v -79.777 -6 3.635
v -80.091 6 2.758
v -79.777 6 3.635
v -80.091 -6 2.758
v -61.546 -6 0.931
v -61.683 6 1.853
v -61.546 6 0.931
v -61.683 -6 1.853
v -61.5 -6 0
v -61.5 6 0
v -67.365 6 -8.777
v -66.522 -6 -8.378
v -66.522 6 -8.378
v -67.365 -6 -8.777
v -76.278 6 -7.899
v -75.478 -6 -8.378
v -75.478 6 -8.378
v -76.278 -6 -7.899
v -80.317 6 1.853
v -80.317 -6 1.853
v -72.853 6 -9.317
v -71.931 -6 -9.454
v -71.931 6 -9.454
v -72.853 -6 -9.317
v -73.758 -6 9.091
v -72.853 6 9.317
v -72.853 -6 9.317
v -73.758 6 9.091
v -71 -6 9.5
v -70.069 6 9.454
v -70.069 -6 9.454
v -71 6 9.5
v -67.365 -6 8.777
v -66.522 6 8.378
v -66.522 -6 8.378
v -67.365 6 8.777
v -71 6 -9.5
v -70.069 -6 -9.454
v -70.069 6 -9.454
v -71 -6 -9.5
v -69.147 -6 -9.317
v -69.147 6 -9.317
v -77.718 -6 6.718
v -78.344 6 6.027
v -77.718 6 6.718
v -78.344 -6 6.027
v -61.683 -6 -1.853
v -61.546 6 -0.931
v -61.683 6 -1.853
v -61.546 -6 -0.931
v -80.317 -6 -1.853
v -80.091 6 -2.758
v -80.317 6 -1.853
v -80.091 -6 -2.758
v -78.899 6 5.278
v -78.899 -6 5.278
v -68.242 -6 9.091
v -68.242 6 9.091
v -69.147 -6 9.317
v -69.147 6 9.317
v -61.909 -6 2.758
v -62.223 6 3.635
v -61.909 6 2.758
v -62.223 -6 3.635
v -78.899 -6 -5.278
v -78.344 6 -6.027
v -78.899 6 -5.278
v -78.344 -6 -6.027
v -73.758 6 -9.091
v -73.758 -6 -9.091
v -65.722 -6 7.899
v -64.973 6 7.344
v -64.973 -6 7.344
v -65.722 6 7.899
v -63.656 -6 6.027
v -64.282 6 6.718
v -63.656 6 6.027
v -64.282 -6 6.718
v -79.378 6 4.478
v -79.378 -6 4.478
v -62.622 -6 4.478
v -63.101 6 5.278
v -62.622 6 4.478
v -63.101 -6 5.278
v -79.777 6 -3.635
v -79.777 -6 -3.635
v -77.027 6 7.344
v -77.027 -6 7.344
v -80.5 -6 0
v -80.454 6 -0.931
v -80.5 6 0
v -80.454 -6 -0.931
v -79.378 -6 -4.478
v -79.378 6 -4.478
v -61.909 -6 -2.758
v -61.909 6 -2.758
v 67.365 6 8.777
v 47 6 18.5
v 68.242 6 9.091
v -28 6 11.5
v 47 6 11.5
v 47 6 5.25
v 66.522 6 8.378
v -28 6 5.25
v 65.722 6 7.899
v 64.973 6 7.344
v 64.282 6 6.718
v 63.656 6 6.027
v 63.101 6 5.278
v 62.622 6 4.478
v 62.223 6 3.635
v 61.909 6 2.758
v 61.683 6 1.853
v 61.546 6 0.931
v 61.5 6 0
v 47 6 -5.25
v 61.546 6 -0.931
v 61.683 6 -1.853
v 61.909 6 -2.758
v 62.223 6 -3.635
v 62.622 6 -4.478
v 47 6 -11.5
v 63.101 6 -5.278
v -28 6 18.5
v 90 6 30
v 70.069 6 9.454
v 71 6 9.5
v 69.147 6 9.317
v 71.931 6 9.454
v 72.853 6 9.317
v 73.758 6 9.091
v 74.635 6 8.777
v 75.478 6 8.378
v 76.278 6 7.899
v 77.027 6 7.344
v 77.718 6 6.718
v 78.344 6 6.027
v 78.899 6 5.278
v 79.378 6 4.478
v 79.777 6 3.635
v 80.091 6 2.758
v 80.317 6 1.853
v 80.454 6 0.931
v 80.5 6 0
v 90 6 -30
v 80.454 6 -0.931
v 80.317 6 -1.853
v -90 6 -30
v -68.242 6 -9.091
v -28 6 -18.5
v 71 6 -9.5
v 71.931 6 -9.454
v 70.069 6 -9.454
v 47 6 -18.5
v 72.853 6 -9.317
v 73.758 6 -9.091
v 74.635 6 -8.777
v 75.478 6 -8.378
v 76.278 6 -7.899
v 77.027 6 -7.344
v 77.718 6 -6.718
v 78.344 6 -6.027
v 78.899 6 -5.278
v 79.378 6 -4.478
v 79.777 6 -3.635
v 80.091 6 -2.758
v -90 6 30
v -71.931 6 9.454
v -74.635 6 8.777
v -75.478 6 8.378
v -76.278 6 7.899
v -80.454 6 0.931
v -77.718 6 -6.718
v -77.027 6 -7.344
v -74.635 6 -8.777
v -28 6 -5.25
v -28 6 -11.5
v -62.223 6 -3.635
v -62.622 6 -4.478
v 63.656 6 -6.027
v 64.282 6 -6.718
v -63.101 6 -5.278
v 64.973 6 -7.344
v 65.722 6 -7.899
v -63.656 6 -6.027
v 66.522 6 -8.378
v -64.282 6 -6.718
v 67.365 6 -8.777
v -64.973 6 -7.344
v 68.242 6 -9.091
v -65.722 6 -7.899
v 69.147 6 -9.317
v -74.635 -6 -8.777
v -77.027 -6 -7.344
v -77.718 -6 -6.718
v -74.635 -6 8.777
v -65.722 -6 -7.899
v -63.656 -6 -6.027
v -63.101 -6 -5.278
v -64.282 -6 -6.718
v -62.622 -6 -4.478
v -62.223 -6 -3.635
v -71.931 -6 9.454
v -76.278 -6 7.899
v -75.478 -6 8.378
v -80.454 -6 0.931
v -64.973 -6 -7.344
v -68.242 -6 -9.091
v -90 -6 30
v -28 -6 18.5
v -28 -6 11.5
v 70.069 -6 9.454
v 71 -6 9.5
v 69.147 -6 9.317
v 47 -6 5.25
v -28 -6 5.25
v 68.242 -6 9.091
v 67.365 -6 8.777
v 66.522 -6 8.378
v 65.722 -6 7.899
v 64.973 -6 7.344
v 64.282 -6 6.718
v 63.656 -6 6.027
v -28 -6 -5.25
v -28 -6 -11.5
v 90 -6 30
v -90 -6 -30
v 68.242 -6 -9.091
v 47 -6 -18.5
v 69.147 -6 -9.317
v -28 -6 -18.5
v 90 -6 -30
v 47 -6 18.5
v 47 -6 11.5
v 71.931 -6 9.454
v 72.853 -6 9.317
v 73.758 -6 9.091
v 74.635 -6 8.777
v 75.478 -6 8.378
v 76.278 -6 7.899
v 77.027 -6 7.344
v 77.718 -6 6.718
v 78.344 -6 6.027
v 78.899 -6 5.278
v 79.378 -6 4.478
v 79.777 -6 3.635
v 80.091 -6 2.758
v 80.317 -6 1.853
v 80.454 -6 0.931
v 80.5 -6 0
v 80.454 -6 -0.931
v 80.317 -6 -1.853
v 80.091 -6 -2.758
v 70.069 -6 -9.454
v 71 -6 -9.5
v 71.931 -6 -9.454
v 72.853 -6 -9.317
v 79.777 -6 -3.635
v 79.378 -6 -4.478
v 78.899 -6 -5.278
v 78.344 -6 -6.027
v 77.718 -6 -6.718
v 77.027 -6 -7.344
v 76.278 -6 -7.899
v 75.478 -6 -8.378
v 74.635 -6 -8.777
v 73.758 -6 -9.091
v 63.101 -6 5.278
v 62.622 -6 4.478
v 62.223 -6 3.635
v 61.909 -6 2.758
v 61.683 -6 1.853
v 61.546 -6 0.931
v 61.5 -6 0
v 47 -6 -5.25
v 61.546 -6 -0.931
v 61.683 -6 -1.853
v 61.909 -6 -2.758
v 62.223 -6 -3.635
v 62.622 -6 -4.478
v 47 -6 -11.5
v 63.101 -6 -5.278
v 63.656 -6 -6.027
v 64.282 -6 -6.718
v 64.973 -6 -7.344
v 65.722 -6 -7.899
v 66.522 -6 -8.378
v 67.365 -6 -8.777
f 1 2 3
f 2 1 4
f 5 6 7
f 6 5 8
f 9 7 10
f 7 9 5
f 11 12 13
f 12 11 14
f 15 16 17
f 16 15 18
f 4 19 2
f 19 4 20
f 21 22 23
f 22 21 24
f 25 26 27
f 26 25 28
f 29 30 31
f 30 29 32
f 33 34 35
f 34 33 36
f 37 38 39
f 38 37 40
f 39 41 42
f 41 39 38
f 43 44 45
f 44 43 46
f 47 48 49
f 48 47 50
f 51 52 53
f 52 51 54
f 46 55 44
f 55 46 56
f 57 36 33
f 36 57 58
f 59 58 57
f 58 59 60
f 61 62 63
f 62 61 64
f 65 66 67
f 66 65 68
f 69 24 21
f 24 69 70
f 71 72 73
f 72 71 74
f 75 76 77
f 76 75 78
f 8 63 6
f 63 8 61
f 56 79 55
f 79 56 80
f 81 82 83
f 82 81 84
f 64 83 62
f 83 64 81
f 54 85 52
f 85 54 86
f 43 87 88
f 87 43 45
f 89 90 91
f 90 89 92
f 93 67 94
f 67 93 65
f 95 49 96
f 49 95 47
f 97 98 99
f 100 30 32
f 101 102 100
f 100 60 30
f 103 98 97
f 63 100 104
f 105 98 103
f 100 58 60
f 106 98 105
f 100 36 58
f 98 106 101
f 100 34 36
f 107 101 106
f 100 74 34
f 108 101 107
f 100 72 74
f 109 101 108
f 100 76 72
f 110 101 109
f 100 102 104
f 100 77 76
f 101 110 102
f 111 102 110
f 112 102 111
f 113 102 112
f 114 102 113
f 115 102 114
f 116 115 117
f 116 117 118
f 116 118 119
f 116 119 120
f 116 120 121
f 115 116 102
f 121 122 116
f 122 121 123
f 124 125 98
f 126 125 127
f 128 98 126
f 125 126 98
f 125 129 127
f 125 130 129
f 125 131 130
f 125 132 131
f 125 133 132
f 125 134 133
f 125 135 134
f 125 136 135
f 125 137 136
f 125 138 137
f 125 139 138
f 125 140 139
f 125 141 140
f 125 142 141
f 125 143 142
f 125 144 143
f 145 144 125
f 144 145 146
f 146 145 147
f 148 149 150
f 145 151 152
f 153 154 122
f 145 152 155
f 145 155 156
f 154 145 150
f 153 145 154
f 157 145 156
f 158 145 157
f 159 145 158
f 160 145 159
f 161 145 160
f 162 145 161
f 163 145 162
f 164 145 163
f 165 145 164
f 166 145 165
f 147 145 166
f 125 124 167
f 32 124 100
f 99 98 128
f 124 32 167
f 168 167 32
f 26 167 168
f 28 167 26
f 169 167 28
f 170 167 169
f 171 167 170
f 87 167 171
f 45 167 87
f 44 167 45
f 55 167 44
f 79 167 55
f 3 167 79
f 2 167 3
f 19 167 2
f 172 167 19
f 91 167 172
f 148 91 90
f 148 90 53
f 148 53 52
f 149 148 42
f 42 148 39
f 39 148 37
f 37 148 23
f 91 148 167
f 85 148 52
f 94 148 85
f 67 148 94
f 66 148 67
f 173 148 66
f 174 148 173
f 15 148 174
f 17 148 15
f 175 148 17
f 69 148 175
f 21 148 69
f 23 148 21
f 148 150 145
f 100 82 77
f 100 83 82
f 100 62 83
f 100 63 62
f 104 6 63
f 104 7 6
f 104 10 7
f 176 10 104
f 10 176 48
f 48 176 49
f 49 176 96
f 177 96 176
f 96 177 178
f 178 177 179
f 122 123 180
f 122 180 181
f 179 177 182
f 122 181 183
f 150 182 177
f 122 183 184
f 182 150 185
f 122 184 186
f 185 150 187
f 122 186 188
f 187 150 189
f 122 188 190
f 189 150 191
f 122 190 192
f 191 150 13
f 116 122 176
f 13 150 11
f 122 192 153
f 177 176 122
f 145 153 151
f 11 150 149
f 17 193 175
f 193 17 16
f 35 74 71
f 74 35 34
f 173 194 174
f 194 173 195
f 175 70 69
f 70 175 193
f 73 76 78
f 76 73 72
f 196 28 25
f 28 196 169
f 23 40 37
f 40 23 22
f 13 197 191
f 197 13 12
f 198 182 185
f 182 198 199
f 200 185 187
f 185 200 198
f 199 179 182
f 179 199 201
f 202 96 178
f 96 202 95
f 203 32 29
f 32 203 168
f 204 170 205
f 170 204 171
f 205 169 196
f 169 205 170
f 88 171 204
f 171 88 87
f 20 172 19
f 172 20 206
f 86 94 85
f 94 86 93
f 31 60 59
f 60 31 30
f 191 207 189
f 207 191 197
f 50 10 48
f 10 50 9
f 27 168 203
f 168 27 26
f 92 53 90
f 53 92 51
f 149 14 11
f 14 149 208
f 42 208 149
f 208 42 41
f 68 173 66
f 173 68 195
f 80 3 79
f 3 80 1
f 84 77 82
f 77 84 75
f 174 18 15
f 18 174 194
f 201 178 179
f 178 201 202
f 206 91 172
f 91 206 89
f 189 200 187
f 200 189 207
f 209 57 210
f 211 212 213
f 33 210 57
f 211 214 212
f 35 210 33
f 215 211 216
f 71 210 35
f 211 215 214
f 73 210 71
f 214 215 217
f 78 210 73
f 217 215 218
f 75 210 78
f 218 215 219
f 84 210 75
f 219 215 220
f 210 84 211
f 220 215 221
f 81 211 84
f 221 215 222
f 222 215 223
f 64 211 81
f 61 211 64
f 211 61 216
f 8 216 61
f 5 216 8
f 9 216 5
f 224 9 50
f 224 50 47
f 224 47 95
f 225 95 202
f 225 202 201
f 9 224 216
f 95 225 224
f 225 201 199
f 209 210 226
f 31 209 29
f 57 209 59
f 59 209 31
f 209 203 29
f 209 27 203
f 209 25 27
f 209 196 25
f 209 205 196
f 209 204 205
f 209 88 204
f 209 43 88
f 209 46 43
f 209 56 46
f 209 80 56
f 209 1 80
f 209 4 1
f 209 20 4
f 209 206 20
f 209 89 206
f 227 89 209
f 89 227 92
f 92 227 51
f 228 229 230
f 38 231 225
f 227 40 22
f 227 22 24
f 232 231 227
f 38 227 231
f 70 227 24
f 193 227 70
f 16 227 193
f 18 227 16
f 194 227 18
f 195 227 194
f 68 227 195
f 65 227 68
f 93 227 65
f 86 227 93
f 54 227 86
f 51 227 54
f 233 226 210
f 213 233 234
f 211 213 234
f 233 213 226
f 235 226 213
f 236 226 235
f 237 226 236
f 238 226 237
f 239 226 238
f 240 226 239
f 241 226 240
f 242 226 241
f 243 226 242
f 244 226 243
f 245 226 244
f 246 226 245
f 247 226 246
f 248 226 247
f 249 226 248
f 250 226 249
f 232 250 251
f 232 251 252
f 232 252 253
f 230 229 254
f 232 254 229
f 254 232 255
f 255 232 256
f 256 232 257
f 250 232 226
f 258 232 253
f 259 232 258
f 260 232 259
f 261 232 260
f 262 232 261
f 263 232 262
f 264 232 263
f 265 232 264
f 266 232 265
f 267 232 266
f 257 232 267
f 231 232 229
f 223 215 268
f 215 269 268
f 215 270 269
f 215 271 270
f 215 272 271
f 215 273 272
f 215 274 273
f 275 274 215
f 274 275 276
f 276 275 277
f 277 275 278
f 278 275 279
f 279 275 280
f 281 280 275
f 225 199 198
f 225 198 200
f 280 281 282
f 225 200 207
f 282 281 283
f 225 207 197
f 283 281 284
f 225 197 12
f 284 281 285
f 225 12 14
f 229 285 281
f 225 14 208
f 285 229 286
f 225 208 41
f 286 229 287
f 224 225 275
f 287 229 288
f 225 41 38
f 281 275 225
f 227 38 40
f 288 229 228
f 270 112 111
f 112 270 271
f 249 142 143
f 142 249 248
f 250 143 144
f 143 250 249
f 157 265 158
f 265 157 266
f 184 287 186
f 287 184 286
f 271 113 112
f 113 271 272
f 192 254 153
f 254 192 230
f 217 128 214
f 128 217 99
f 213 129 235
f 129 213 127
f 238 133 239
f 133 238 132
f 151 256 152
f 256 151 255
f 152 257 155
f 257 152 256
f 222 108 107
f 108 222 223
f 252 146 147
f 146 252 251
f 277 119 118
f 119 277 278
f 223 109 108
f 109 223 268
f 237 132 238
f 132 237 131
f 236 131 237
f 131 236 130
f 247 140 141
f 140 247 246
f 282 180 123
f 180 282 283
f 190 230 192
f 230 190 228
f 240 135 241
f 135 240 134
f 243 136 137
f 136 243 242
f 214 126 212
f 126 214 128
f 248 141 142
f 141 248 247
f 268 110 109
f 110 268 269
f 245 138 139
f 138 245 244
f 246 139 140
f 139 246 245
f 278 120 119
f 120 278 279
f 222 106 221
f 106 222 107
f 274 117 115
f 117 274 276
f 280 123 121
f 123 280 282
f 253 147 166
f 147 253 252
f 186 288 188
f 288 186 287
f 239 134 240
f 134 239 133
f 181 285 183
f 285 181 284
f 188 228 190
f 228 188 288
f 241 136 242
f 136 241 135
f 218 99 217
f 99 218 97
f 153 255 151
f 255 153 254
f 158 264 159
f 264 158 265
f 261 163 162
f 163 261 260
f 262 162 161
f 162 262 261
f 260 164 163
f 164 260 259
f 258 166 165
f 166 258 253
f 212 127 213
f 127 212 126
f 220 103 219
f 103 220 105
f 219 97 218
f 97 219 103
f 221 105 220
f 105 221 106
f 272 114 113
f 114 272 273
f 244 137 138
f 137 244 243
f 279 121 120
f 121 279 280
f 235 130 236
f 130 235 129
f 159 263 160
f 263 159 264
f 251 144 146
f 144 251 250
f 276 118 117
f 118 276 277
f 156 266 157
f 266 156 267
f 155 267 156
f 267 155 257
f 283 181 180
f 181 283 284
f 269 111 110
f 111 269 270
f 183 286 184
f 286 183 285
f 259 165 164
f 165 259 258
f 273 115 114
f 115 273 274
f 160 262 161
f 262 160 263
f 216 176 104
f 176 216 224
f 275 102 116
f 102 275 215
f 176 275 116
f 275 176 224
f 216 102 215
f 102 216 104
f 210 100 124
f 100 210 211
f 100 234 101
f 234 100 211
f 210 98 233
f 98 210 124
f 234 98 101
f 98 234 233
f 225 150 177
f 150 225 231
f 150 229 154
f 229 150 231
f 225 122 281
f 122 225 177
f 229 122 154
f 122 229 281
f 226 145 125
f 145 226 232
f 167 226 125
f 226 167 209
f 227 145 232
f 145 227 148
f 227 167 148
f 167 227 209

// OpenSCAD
// GENERAL
$fn = 64;

MAX_LENGTH = 180;
MAX_WIDTH = 180;
MAX_HEIGHT = 300;
AT_CENTER = true;

x_rot = [1,0,0];
y_rot = [0,1,0];
z_rot = [0,0,1];

// Stepper Motor
sm_width = 40;
sm_length = 43;
sm_height = sm_length;
sm_axle_length = 24;
sm_mount_hole = 3;
sm_mount_rails_dis = 15;

// Ball Baring
bb_inner_d = 6;
bb_outer_d = 19;
bb_width = 6;

// core
core_length = MAX_LENGTH;
core_width = 12;
core_height = 60;

// Motor mount rails
mmr_length = 75;
mmr_height = 7;
mmr_top_offset = 5;

// Motor mount
mm_length = sm_length;
mm_height = sm_height;
mm_width = 5;
mm_axle_base_dim = 10;
mm_axle_base_depth = mm_width;

module core() {
    cube([core_length,core_width,core_height], center=AT_CENTER);
}

module ball_baring() {
    color("red") {
        rotate(90,x_rot) {
            cylinder(d=bb_outer_d, h=bb_width,center=AT_CENTER);
        }
    }
}

module ball_barings() {
    translate([-core_length/2+bb_outer_d,0,0]) {
        translate([0,bb_width/2,0])
            ball_baring();
        translate([0,-bb_width/2,0])
            ball_baring();
    }
    translate([core_length/2-bb_outer_d,0,0]){
        translate([0,bb_width/2,0])
            ball_baring();
        translate([0,-bb_width/2,0])
            ball_baring();
    }
}

module motor_mount_rail(scale) {
    color("blue") {
        rotate(90,x_rot) {
            cube([mmr_length,mmr_height*scale,core_width],center=AT_CENTER);
        }
    }
}

module motor_mount_rails() {
    translate([((core_length/2)-(bb_outer_d*2)-(mmr_length/2))-mmr_top_offset,0,0]) {
        motor_mount_rail(1.5);
        translate([0,0,sm_mount_rails_dis]) {
            motor_mount_rail(1.0);
        }
        translate([0,0,-sm_mount_rails_dis]) {
            motor_mount_rail(1.0);
        }
    }
}

module core_drilled_out() {
    difference() {
        // MAIN COMPONENT
        core();
        // BALL BARING HOLES
        ball_barings();
        // MOTOR MOUNT RAILS
        motor_mount_rails();
    }
}

module motor_mount_holes() {
    rotate(90, x_rot) {
    translate([0,0,-mm_width/2]) {
        translate([-(mm_length/2)+6,0,0]) {
            translate([0,(mm_height/2)-6,0])
                cylinder(r=sm_mount_hole, h=mm_width);
            translate([0,-(mm_height/2)+6,0])
                cylinder(r=sm_mount_hole, h=mm_width);
        }
        translate([(mm_length/2)-6,0,0]) {
            translate([0,(mm_height/2)-6,0])
                cylinder(r=sm_mount_hole, h=mm_width);
            translate([0,-(mm_height/2)+6,0])
                cylinder(r=sm_mount_hole, h=mm_width);
            }
        }
    }
}

module motor_mount_drill_out() {
    color("green") {
        translate([0,core_width,0]) {
            difference() {
                cube([mm_length,mm_width,mm_height], center=AT_CENTER);
                motor_mount_holes();
                rotate(90,x_rot)
                    translate([0,0,-mm_width/2])
                        cylinder(r=mm_axle_base_dim, h=mm_axle_base_depth);
            }
        }
    }
}

core_drilled_out();
//motor_mount_drill_out(); 
